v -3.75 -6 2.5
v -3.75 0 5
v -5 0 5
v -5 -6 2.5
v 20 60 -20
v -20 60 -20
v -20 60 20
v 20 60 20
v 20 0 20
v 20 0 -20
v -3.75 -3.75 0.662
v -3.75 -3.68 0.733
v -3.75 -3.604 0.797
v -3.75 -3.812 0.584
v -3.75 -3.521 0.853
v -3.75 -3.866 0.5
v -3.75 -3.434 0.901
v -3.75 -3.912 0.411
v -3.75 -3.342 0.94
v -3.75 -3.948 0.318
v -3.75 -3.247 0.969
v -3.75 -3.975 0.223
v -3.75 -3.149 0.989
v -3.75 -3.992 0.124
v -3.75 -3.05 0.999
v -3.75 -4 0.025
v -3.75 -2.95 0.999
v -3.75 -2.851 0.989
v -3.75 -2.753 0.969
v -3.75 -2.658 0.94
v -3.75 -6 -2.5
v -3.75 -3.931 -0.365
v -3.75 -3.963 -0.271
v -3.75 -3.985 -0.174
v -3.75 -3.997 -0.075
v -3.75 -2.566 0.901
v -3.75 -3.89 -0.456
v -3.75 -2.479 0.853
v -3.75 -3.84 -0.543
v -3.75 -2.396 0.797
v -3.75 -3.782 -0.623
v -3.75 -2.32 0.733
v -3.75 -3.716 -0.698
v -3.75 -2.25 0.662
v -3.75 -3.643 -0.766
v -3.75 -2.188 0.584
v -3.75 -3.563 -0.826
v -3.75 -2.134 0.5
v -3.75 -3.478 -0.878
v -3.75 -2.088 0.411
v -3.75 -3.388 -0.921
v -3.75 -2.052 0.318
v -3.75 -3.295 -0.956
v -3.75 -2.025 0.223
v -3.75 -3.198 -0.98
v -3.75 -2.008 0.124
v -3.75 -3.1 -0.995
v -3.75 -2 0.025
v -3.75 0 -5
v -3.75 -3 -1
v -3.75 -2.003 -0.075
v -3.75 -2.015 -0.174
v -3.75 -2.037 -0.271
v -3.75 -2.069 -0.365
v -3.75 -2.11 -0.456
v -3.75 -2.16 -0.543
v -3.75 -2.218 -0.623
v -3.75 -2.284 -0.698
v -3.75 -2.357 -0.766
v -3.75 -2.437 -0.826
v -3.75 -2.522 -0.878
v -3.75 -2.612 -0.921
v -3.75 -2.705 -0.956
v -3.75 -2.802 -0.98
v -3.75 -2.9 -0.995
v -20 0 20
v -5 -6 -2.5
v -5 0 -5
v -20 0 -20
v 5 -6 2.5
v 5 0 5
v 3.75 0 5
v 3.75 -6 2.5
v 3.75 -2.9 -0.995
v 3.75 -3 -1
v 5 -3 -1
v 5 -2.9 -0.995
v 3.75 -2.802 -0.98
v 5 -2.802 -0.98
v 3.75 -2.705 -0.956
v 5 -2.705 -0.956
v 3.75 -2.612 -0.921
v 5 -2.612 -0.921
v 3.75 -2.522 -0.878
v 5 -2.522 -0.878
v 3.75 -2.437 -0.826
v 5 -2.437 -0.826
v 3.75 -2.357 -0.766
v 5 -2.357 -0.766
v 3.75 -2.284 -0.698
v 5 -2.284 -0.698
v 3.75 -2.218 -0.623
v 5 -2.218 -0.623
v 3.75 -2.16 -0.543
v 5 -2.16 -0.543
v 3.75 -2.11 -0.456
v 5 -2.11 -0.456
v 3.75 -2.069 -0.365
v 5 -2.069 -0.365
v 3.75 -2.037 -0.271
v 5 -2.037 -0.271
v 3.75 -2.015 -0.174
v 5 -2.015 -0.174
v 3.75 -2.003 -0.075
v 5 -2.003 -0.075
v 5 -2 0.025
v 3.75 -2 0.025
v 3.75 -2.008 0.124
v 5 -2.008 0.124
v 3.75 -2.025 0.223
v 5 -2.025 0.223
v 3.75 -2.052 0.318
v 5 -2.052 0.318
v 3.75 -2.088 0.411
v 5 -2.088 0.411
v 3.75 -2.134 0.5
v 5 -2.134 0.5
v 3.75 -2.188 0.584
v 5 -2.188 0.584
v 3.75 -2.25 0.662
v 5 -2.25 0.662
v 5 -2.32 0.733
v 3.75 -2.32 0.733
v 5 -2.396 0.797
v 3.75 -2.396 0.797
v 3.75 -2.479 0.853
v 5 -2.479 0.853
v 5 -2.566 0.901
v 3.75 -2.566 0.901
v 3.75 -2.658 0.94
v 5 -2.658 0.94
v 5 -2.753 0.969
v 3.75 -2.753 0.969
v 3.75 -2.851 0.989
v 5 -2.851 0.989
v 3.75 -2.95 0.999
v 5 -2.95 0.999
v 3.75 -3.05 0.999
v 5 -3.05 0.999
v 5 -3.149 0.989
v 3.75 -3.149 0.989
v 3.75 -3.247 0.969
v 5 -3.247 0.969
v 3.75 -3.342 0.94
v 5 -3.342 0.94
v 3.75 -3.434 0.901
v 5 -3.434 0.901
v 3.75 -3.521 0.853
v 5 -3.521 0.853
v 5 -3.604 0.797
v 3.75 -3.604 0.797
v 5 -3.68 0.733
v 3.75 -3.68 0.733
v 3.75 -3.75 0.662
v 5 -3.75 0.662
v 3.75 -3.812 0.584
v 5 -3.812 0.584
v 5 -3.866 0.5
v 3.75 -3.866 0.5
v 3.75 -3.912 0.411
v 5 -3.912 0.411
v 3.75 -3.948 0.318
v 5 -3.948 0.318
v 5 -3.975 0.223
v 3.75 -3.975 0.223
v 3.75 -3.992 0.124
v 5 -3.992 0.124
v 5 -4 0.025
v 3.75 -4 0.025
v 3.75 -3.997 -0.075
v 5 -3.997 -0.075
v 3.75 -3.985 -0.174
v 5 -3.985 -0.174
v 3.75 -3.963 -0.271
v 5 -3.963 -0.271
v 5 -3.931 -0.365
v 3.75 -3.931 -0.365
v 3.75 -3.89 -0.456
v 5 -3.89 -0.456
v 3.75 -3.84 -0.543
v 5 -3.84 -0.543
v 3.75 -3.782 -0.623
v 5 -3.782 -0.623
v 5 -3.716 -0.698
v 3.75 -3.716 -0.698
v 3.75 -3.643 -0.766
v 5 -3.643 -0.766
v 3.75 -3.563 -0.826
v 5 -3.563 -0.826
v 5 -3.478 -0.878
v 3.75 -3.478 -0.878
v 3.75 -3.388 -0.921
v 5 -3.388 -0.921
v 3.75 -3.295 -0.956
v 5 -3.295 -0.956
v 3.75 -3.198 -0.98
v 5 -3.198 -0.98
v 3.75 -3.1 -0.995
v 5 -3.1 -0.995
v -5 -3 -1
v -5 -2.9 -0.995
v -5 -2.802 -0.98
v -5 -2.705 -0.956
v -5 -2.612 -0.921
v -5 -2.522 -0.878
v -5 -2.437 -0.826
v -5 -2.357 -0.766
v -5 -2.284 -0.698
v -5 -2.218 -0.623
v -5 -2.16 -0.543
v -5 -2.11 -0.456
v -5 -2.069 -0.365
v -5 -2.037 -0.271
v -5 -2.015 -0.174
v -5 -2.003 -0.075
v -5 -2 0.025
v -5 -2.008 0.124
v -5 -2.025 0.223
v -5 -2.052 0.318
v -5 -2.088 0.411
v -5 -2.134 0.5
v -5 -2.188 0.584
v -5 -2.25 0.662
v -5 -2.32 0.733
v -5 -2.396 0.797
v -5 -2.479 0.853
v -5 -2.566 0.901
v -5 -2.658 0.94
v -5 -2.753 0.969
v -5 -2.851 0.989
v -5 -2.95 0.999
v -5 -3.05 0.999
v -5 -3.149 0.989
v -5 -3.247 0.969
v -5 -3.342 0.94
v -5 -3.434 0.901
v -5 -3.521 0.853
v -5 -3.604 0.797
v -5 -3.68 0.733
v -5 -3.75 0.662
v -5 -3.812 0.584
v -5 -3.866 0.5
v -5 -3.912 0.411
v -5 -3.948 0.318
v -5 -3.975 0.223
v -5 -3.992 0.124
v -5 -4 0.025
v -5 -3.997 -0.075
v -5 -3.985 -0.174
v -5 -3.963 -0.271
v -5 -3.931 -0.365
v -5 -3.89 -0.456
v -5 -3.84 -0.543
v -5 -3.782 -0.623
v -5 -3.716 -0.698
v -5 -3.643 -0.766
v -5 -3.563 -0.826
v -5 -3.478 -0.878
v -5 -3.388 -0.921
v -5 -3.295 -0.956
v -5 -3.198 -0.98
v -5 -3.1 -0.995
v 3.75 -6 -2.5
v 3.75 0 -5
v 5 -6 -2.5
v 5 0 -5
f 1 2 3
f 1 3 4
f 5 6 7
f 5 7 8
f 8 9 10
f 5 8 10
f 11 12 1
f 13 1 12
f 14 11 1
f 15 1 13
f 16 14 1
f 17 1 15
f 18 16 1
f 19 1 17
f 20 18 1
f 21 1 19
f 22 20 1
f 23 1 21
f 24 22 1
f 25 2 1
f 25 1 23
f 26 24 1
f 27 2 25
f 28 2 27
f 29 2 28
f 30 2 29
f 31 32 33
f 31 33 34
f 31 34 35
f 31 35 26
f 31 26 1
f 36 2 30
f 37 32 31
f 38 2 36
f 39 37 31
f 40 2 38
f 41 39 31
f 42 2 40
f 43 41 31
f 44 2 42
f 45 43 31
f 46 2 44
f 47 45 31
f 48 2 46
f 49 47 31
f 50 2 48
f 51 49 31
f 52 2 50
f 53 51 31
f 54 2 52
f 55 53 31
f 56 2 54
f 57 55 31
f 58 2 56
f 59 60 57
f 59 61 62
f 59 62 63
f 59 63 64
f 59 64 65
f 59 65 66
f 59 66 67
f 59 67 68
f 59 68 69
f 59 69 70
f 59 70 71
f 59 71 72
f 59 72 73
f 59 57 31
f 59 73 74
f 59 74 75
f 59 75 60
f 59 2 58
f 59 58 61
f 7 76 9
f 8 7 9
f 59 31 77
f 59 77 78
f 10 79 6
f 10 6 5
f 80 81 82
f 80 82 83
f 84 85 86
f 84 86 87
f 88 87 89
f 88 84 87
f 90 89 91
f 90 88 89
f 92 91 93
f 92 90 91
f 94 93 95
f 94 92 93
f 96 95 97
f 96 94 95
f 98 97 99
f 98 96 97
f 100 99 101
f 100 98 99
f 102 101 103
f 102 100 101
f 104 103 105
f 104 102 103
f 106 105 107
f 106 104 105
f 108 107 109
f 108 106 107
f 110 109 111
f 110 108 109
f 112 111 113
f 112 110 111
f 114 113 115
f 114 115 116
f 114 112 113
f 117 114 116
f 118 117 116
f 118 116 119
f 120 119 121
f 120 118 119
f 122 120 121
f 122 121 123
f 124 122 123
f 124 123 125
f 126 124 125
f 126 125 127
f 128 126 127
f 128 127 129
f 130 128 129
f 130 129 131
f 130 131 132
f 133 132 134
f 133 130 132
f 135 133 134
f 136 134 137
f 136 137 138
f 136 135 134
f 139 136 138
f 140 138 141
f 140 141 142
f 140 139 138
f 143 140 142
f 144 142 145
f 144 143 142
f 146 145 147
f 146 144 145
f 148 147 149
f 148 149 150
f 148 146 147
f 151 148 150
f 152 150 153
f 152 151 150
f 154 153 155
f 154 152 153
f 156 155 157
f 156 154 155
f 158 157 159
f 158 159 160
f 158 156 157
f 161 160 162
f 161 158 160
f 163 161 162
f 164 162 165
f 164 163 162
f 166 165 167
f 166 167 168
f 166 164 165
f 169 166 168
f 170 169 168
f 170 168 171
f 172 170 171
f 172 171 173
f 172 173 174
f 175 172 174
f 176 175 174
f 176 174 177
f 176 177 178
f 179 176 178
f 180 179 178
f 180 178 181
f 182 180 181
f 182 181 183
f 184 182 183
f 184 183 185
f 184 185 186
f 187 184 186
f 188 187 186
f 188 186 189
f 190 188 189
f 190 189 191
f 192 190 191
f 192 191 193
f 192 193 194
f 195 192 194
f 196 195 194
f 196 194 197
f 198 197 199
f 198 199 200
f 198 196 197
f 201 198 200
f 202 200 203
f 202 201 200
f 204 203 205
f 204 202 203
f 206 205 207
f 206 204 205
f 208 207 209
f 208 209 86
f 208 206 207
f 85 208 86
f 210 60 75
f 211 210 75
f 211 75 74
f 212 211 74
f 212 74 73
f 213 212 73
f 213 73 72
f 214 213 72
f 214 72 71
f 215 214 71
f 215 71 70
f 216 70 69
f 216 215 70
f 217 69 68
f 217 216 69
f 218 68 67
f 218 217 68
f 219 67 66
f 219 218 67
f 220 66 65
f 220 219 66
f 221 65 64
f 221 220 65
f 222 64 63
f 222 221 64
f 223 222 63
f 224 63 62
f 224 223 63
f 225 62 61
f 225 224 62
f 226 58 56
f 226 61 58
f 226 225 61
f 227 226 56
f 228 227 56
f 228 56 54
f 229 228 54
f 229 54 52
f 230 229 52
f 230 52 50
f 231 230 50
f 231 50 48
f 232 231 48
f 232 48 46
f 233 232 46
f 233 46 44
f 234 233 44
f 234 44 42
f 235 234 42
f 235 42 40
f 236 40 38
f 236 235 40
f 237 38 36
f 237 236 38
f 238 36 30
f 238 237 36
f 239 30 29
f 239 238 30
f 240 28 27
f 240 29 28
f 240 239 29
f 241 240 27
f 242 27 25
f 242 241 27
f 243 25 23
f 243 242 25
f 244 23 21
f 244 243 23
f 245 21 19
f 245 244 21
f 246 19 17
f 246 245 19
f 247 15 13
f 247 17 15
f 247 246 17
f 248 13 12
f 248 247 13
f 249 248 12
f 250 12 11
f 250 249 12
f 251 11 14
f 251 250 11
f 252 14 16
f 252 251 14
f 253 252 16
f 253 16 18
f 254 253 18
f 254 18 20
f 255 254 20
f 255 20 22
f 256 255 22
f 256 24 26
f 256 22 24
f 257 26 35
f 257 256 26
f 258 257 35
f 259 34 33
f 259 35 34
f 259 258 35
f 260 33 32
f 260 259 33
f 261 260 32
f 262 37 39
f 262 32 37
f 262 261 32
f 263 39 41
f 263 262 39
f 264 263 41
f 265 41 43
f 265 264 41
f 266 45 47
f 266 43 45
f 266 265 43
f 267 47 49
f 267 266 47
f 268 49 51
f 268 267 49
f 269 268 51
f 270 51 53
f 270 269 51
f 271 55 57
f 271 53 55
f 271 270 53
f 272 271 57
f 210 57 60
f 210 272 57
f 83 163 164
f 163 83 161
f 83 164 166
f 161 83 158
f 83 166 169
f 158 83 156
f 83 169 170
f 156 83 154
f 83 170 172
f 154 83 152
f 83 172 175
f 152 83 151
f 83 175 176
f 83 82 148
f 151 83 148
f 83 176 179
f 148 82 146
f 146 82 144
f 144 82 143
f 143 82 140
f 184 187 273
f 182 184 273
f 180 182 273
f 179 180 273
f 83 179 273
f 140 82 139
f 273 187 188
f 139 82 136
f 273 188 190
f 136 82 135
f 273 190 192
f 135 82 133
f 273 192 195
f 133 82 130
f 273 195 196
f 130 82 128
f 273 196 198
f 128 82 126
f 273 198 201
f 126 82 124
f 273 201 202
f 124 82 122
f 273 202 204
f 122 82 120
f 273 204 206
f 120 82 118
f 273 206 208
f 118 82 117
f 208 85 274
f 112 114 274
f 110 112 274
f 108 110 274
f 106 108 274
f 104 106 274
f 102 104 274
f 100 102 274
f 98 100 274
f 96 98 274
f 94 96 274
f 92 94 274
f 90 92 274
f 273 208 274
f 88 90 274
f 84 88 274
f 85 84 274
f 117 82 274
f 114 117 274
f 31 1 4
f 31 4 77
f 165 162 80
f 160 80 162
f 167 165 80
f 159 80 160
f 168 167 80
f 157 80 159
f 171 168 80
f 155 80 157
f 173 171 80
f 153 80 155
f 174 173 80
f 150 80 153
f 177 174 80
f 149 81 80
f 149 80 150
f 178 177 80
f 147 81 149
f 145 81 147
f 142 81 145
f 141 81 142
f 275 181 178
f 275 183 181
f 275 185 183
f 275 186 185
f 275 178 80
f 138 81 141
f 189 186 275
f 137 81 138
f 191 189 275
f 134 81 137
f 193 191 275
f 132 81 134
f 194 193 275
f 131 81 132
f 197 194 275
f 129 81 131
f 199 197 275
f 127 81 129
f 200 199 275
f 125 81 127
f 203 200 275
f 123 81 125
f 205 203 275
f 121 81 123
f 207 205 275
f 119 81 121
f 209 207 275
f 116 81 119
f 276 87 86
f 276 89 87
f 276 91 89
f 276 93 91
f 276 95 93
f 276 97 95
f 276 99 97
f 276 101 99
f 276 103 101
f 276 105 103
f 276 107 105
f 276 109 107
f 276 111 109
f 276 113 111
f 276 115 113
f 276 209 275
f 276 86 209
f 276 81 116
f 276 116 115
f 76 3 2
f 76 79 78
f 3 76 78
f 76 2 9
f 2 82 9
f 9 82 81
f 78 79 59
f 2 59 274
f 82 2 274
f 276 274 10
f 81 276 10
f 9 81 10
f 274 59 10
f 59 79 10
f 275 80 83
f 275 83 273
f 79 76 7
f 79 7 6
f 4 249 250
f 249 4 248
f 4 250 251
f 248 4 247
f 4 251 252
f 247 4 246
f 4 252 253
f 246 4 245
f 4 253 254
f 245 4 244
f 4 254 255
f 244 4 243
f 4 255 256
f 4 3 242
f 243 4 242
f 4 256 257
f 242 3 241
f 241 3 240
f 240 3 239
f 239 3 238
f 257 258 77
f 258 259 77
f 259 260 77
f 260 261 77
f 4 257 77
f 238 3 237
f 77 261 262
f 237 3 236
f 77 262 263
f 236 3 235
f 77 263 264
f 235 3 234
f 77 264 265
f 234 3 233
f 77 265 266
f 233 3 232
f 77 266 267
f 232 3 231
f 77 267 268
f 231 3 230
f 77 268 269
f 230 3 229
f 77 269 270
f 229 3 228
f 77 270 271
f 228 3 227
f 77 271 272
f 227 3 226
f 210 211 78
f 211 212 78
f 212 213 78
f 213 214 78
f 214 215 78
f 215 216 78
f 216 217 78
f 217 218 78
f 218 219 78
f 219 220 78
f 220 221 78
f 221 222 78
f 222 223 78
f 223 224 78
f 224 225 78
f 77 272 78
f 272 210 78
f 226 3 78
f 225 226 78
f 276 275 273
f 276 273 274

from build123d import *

# Parameters (mm, degrees)
SKETCH1_W           = 40
SKETCH1_H           = 40
BOSS_EXTRUDE1_DEPTH = 60
SKETCH3_R           = 1
BOSS_EXTRUDE2_DEPTH = 5
SKETCH4_W           = 19.244231552
SKETCH4_H           = 7.397169782
CUT_EXTRUDE1_DEPTH  = 3.75


with BuildPart() as part:
    # Sketch1 → Boss-Extrude1 (new body)
    with BuildSketch(Plane(origin=(0, 0, 0), x_dir=(1, 0, 0), z_dir=(0, 1, 0))):
        Rectangle(SKETCH1_W, SKETCH1_H)
    extrude(amount=BOSS_EXTRUDE1_DEPTH)

    # Sketch3 → Boss-Extrude2 (add, symmetric)
    with BuildSketch(Plane(origin=(0, 0, 0), x_dir=(0, 0, -1), z_dir=(1, 0, 0))):
        Polygon((-5, 0), (-2.5, -6), (2.5, -6), (5, 0), align=None)
        with Locations((0, -3)):
            Circle(SKETCH3_R, mode=Mode.SUBTRACT)
    extrude(amount=BOSS_EXTRUDE2_DEPTH, both=True)

    # Sketch4 → Cut-Extrude1 (cut, symmetric)
    with BuildSketch(Plane(origin=(0, 0, 0), x_dir=(0, 0, -1), z_dir=(1, 0, 0))):
        with Locations((0.530352838, -3.698584891)):
            Rectangle(SKETCH4_W, SKETCH4_H)
    extrude(amount=CUT_EXTRUDE1_DEPTH, both=True, mode=Mode.SUBTRACT)


solid = part.part
